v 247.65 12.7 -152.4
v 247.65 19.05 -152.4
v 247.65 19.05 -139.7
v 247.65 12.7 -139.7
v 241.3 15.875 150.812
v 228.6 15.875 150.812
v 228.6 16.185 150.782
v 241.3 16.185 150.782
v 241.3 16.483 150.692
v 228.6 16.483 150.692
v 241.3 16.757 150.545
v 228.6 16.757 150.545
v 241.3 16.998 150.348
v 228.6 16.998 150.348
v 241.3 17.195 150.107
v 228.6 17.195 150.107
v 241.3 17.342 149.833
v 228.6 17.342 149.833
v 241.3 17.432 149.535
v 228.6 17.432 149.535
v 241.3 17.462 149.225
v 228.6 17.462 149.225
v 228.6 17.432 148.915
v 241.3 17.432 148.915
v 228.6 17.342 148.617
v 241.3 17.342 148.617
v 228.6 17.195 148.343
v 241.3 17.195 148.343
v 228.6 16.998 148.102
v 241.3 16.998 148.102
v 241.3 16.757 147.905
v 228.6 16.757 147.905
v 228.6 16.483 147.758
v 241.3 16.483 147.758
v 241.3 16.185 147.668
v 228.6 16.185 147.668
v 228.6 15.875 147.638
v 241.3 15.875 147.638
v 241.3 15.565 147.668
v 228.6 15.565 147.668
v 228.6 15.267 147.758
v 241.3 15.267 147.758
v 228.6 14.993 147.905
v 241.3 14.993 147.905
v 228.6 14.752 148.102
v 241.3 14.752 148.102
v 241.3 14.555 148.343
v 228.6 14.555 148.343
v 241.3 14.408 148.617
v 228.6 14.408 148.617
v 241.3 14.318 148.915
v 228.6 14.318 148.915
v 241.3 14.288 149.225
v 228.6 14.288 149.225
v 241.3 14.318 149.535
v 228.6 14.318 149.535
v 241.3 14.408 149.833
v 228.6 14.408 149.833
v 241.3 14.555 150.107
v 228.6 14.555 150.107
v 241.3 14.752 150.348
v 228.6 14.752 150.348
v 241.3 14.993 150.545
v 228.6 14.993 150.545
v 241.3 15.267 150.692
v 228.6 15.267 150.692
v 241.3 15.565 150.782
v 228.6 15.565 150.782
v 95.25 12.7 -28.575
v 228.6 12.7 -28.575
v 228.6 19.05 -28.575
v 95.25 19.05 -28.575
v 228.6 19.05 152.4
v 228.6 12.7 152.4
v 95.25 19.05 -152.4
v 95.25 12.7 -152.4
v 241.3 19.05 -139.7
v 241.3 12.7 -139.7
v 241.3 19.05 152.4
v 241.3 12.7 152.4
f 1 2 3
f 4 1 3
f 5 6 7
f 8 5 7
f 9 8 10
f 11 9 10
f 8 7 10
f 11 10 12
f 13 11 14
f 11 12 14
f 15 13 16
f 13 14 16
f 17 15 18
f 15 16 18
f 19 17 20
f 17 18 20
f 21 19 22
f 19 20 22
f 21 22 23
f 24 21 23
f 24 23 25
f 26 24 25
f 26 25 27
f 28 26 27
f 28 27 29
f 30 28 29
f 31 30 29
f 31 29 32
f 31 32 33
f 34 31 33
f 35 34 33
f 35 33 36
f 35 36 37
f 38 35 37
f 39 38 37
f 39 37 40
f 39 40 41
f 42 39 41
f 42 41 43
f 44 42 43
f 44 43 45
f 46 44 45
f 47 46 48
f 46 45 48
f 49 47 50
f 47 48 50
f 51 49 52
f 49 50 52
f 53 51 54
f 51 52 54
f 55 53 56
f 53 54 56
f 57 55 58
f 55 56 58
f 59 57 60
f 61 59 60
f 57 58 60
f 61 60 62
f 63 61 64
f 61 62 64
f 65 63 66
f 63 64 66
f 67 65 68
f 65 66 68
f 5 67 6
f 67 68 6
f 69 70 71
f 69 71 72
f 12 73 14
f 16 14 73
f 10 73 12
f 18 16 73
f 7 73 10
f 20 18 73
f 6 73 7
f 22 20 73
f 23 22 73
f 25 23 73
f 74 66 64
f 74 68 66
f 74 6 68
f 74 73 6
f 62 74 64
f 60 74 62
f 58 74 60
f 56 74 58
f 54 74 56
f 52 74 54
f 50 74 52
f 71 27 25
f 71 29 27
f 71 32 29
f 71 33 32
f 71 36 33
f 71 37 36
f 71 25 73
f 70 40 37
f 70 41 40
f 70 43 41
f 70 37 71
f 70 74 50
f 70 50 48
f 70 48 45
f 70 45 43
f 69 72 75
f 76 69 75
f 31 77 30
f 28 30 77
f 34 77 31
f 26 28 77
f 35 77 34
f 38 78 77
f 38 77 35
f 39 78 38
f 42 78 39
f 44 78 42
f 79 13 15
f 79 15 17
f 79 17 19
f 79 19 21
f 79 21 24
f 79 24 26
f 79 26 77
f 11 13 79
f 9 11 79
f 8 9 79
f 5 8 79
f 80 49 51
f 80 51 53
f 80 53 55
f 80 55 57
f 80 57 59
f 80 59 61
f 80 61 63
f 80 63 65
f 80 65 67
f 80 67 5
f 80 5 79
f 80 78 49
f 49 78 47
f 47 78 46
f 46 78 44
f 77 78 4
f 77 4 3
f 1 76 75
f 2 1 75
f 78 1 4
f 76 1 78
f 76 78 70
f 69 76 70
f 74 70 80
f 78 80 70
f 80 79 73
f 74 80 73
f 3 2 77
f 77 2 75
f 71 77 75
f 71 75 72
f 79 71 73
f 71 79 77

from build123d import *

# Parameters (mm, degrees)
SKETCH1_W           = 482.6
SKETCH1_H           = 304.8
BOSS_EXTRUDE1_DEPTH = 12.7
BOSS_EXTRUDE2_DEPTH = 6.35
SKETCH3_R           = 1.5875
CUT_EXTRUDE1_DEPTH  = 507.449822292
SKETCH4_W           = 6.35
SKETCH4_H           = 12.7
BOSS_EXTRUDE3_DEPTH = 292.1
SKETCH5_W           = 12.7
SKETCH5_H           = 19.05
BOSS_EXTRUDE4_DEPTH = 6.35
CUT_EXTRUDE2_START  = 6.35
CUT_EXTRUDE2_DEPTH  = 25.4
CUT_EXTRUDE3_START  = -488.95
CUT_EXTRUDE3_DEPTH  = 25.4
BOSS_EXTRUDE5_START = -2.54
BOSS_EXTRUDE5_DEPTH = 7.62
SKETCH13_W          = 304.8
SKETCH13_H          = 12.7
CUT_EXTRUDE4_DEPTH  = 519.566054134
SKETCH17_W          = 369.208963073
SKETCH17_H          = 308.023191689
CUT_EXTRUDE7_DEPTH  = 291.854955261


with BuildPart() as part:
    # Sketch1 → Boss-Extrude1 (new body)
    with BuildSketch(Plane(origin=(0, 0, 0), x_dir=(1, 0, 0), z_dir=(0, 1, 0))):
        Rectangle(SKETCH1_W, SKETCH1_H)
    extrude(amount=BOSS_EXTRUDE1_DEPTH)

    # Sketch2 → Boss-Extrude2 (add)
    with BuildSketch(Plane(origin=(0, 12.7, 0), x_dir=(1, 0, 0), z_dir=(0, 1, 0))):
        Polygon((-241.3, 152.4), (-228.6, 152.4), (228.6, 152.4), (241.3, 152.4), (241.3, -152.4), (228.6, -152.4), (228.6, 28.575), (-228.6, 28.575), (-228.6, -152.4), (-241.3, -152.4), align=None)
    extrude(amount=BOSS_EXTRUDE2_DEPTH)

    # Sketch3 → Cut-Extrude1 (cut, through all)
    with BuildSketch(Plane.ZY.offset(241.3)):
        with Locations((149.225, 15.875)):
            Circle(SKETCH3_R)
    extrude(amount=-CUT_EXTRUDE1_DEPTH, mode=Mode.SUBTRACT)

    # Sketch4 → Boss-Extrude3 (add)
    with BuildSketch(Plane.XY.offset(152.4)):
        with Locations((-244.475, 6.35)):
            Rectangle(SKETCH4_W, SKETCH4_H)
    boss_extrude3 = extrude(amount=-BOSS_EXTRUDE3_DEPTH)

    # Sketch5 → Boss-Extrude4 (add)
    with BuildSketch(Plane.ZY.offset(241.3)):
        with Locations((-146.05, 9.525)):
            Rectangle(SKETCH5_W, SKETCH5_H)
    boss_extrude4 = extrude(amount=BOSS_EXTRUDE4_DEPTH)

    # Mirror1: Boss-Extrude3, Boss-Extrude4 across plane
    add(boss_extrude3.mirror(Plane(origin=(0, 0, 0), x_dir=(0, 0, 1), z_dir=(1, 0, 0))))
    add(boss_extrude4.mirror(Plane(origin=(0, 0, 0), x_dir=(0, 0, 1), z_dir=(1, 0, 0))))

    # Sketch6 → Cut-Extrude2 (cut)
    with BuildSketch(Plane.ZY.offset(241.3).offset(CUT_EXTRUDE2_START)):
        with BuildLine():
            Line((147.32, 2.54), (128.27, 2.54))
            ThreePointArc((128.27, 2.54), (124.46, 6.35), (128.27, 10.16))
            Line((128.27, 10.16), (147.32, 10.16))
            ThreePointArc((147.32, 10.16), (151.13, 6.35), (147.32, 2.54))
        make_face()
    extrude(amount=-CUT_EXTRUDE2_DEPTH, mode=Mode.SUBTRACT)

    # Sketch6<2> → Cut-Extrude3 (cut)
    with BuildSketch(Plane.ZY.offset(241.3).offset(CUT_EXTRUDE3_START)):
        with BuildLine():
            Line((147.32, 2.54), (128.27, 2.54))
            ThreePointArc((128.27, 2.54), (124.46, 6.35), (128.27, 10.16))
            Line((128.27, 10.16), (147.32, 10.16))
            ThreePointArc((147.32, 10.16), (151.13, 6.35), (147.32, 2.54))
        make_face()
    extrude(amount=CUT_EXTRUDE3_DEPTH, mode=Mode.SUBTRACT)

    # Sketch11 → Boss-Extrude5 (add)
    with BuildSketch(Plane.XZ.offset(BOSS_EXTRUDE5_START)):
        Polygon((-247.65, 124.46), (-222.25, 124.46), (-222.25, 140.97), align=None)
    boss_extrude5 = extrude(amount=-BOSS_EXTRUDE5_DEPTH)

    # Mirror2: Boss-Extrude5 across plane
    add(boss_extrude5.mirror(Plane(origin=(0, 0, 0), x_dir=(0, 0, 1), z_dir=(1, 0, 0))))

    # Sketch13 → Cut-Extrude4 (cut, through all)
    with BuildSketch(Plane.ZY.offset(247.65)):
        with Locations((0, 6.35)):
            Rectangle(SKETCH13_W, SKETCH13_H)
    extrude(amount=-CUT_EXTRUDE4_DEPTH, mode=Mode.SUBTRACT)

    # Sketch17 → Cut-Extrude7 (cut, through all)
    with BuildSketch(Plane(origin=(0, 19.05, 0), x_dir=(1, 0, 0), z_dir=(0, 1, 0))):
        with Locations((-89.354481537, -1.611595845)):
            Rectangle(SKETCH17_W, SKETCH17_H)
    extrude(amount=-CUT_EXTRUDE7_DEPTH, mode=Mode.SUBTRACT)


solid = part.part
